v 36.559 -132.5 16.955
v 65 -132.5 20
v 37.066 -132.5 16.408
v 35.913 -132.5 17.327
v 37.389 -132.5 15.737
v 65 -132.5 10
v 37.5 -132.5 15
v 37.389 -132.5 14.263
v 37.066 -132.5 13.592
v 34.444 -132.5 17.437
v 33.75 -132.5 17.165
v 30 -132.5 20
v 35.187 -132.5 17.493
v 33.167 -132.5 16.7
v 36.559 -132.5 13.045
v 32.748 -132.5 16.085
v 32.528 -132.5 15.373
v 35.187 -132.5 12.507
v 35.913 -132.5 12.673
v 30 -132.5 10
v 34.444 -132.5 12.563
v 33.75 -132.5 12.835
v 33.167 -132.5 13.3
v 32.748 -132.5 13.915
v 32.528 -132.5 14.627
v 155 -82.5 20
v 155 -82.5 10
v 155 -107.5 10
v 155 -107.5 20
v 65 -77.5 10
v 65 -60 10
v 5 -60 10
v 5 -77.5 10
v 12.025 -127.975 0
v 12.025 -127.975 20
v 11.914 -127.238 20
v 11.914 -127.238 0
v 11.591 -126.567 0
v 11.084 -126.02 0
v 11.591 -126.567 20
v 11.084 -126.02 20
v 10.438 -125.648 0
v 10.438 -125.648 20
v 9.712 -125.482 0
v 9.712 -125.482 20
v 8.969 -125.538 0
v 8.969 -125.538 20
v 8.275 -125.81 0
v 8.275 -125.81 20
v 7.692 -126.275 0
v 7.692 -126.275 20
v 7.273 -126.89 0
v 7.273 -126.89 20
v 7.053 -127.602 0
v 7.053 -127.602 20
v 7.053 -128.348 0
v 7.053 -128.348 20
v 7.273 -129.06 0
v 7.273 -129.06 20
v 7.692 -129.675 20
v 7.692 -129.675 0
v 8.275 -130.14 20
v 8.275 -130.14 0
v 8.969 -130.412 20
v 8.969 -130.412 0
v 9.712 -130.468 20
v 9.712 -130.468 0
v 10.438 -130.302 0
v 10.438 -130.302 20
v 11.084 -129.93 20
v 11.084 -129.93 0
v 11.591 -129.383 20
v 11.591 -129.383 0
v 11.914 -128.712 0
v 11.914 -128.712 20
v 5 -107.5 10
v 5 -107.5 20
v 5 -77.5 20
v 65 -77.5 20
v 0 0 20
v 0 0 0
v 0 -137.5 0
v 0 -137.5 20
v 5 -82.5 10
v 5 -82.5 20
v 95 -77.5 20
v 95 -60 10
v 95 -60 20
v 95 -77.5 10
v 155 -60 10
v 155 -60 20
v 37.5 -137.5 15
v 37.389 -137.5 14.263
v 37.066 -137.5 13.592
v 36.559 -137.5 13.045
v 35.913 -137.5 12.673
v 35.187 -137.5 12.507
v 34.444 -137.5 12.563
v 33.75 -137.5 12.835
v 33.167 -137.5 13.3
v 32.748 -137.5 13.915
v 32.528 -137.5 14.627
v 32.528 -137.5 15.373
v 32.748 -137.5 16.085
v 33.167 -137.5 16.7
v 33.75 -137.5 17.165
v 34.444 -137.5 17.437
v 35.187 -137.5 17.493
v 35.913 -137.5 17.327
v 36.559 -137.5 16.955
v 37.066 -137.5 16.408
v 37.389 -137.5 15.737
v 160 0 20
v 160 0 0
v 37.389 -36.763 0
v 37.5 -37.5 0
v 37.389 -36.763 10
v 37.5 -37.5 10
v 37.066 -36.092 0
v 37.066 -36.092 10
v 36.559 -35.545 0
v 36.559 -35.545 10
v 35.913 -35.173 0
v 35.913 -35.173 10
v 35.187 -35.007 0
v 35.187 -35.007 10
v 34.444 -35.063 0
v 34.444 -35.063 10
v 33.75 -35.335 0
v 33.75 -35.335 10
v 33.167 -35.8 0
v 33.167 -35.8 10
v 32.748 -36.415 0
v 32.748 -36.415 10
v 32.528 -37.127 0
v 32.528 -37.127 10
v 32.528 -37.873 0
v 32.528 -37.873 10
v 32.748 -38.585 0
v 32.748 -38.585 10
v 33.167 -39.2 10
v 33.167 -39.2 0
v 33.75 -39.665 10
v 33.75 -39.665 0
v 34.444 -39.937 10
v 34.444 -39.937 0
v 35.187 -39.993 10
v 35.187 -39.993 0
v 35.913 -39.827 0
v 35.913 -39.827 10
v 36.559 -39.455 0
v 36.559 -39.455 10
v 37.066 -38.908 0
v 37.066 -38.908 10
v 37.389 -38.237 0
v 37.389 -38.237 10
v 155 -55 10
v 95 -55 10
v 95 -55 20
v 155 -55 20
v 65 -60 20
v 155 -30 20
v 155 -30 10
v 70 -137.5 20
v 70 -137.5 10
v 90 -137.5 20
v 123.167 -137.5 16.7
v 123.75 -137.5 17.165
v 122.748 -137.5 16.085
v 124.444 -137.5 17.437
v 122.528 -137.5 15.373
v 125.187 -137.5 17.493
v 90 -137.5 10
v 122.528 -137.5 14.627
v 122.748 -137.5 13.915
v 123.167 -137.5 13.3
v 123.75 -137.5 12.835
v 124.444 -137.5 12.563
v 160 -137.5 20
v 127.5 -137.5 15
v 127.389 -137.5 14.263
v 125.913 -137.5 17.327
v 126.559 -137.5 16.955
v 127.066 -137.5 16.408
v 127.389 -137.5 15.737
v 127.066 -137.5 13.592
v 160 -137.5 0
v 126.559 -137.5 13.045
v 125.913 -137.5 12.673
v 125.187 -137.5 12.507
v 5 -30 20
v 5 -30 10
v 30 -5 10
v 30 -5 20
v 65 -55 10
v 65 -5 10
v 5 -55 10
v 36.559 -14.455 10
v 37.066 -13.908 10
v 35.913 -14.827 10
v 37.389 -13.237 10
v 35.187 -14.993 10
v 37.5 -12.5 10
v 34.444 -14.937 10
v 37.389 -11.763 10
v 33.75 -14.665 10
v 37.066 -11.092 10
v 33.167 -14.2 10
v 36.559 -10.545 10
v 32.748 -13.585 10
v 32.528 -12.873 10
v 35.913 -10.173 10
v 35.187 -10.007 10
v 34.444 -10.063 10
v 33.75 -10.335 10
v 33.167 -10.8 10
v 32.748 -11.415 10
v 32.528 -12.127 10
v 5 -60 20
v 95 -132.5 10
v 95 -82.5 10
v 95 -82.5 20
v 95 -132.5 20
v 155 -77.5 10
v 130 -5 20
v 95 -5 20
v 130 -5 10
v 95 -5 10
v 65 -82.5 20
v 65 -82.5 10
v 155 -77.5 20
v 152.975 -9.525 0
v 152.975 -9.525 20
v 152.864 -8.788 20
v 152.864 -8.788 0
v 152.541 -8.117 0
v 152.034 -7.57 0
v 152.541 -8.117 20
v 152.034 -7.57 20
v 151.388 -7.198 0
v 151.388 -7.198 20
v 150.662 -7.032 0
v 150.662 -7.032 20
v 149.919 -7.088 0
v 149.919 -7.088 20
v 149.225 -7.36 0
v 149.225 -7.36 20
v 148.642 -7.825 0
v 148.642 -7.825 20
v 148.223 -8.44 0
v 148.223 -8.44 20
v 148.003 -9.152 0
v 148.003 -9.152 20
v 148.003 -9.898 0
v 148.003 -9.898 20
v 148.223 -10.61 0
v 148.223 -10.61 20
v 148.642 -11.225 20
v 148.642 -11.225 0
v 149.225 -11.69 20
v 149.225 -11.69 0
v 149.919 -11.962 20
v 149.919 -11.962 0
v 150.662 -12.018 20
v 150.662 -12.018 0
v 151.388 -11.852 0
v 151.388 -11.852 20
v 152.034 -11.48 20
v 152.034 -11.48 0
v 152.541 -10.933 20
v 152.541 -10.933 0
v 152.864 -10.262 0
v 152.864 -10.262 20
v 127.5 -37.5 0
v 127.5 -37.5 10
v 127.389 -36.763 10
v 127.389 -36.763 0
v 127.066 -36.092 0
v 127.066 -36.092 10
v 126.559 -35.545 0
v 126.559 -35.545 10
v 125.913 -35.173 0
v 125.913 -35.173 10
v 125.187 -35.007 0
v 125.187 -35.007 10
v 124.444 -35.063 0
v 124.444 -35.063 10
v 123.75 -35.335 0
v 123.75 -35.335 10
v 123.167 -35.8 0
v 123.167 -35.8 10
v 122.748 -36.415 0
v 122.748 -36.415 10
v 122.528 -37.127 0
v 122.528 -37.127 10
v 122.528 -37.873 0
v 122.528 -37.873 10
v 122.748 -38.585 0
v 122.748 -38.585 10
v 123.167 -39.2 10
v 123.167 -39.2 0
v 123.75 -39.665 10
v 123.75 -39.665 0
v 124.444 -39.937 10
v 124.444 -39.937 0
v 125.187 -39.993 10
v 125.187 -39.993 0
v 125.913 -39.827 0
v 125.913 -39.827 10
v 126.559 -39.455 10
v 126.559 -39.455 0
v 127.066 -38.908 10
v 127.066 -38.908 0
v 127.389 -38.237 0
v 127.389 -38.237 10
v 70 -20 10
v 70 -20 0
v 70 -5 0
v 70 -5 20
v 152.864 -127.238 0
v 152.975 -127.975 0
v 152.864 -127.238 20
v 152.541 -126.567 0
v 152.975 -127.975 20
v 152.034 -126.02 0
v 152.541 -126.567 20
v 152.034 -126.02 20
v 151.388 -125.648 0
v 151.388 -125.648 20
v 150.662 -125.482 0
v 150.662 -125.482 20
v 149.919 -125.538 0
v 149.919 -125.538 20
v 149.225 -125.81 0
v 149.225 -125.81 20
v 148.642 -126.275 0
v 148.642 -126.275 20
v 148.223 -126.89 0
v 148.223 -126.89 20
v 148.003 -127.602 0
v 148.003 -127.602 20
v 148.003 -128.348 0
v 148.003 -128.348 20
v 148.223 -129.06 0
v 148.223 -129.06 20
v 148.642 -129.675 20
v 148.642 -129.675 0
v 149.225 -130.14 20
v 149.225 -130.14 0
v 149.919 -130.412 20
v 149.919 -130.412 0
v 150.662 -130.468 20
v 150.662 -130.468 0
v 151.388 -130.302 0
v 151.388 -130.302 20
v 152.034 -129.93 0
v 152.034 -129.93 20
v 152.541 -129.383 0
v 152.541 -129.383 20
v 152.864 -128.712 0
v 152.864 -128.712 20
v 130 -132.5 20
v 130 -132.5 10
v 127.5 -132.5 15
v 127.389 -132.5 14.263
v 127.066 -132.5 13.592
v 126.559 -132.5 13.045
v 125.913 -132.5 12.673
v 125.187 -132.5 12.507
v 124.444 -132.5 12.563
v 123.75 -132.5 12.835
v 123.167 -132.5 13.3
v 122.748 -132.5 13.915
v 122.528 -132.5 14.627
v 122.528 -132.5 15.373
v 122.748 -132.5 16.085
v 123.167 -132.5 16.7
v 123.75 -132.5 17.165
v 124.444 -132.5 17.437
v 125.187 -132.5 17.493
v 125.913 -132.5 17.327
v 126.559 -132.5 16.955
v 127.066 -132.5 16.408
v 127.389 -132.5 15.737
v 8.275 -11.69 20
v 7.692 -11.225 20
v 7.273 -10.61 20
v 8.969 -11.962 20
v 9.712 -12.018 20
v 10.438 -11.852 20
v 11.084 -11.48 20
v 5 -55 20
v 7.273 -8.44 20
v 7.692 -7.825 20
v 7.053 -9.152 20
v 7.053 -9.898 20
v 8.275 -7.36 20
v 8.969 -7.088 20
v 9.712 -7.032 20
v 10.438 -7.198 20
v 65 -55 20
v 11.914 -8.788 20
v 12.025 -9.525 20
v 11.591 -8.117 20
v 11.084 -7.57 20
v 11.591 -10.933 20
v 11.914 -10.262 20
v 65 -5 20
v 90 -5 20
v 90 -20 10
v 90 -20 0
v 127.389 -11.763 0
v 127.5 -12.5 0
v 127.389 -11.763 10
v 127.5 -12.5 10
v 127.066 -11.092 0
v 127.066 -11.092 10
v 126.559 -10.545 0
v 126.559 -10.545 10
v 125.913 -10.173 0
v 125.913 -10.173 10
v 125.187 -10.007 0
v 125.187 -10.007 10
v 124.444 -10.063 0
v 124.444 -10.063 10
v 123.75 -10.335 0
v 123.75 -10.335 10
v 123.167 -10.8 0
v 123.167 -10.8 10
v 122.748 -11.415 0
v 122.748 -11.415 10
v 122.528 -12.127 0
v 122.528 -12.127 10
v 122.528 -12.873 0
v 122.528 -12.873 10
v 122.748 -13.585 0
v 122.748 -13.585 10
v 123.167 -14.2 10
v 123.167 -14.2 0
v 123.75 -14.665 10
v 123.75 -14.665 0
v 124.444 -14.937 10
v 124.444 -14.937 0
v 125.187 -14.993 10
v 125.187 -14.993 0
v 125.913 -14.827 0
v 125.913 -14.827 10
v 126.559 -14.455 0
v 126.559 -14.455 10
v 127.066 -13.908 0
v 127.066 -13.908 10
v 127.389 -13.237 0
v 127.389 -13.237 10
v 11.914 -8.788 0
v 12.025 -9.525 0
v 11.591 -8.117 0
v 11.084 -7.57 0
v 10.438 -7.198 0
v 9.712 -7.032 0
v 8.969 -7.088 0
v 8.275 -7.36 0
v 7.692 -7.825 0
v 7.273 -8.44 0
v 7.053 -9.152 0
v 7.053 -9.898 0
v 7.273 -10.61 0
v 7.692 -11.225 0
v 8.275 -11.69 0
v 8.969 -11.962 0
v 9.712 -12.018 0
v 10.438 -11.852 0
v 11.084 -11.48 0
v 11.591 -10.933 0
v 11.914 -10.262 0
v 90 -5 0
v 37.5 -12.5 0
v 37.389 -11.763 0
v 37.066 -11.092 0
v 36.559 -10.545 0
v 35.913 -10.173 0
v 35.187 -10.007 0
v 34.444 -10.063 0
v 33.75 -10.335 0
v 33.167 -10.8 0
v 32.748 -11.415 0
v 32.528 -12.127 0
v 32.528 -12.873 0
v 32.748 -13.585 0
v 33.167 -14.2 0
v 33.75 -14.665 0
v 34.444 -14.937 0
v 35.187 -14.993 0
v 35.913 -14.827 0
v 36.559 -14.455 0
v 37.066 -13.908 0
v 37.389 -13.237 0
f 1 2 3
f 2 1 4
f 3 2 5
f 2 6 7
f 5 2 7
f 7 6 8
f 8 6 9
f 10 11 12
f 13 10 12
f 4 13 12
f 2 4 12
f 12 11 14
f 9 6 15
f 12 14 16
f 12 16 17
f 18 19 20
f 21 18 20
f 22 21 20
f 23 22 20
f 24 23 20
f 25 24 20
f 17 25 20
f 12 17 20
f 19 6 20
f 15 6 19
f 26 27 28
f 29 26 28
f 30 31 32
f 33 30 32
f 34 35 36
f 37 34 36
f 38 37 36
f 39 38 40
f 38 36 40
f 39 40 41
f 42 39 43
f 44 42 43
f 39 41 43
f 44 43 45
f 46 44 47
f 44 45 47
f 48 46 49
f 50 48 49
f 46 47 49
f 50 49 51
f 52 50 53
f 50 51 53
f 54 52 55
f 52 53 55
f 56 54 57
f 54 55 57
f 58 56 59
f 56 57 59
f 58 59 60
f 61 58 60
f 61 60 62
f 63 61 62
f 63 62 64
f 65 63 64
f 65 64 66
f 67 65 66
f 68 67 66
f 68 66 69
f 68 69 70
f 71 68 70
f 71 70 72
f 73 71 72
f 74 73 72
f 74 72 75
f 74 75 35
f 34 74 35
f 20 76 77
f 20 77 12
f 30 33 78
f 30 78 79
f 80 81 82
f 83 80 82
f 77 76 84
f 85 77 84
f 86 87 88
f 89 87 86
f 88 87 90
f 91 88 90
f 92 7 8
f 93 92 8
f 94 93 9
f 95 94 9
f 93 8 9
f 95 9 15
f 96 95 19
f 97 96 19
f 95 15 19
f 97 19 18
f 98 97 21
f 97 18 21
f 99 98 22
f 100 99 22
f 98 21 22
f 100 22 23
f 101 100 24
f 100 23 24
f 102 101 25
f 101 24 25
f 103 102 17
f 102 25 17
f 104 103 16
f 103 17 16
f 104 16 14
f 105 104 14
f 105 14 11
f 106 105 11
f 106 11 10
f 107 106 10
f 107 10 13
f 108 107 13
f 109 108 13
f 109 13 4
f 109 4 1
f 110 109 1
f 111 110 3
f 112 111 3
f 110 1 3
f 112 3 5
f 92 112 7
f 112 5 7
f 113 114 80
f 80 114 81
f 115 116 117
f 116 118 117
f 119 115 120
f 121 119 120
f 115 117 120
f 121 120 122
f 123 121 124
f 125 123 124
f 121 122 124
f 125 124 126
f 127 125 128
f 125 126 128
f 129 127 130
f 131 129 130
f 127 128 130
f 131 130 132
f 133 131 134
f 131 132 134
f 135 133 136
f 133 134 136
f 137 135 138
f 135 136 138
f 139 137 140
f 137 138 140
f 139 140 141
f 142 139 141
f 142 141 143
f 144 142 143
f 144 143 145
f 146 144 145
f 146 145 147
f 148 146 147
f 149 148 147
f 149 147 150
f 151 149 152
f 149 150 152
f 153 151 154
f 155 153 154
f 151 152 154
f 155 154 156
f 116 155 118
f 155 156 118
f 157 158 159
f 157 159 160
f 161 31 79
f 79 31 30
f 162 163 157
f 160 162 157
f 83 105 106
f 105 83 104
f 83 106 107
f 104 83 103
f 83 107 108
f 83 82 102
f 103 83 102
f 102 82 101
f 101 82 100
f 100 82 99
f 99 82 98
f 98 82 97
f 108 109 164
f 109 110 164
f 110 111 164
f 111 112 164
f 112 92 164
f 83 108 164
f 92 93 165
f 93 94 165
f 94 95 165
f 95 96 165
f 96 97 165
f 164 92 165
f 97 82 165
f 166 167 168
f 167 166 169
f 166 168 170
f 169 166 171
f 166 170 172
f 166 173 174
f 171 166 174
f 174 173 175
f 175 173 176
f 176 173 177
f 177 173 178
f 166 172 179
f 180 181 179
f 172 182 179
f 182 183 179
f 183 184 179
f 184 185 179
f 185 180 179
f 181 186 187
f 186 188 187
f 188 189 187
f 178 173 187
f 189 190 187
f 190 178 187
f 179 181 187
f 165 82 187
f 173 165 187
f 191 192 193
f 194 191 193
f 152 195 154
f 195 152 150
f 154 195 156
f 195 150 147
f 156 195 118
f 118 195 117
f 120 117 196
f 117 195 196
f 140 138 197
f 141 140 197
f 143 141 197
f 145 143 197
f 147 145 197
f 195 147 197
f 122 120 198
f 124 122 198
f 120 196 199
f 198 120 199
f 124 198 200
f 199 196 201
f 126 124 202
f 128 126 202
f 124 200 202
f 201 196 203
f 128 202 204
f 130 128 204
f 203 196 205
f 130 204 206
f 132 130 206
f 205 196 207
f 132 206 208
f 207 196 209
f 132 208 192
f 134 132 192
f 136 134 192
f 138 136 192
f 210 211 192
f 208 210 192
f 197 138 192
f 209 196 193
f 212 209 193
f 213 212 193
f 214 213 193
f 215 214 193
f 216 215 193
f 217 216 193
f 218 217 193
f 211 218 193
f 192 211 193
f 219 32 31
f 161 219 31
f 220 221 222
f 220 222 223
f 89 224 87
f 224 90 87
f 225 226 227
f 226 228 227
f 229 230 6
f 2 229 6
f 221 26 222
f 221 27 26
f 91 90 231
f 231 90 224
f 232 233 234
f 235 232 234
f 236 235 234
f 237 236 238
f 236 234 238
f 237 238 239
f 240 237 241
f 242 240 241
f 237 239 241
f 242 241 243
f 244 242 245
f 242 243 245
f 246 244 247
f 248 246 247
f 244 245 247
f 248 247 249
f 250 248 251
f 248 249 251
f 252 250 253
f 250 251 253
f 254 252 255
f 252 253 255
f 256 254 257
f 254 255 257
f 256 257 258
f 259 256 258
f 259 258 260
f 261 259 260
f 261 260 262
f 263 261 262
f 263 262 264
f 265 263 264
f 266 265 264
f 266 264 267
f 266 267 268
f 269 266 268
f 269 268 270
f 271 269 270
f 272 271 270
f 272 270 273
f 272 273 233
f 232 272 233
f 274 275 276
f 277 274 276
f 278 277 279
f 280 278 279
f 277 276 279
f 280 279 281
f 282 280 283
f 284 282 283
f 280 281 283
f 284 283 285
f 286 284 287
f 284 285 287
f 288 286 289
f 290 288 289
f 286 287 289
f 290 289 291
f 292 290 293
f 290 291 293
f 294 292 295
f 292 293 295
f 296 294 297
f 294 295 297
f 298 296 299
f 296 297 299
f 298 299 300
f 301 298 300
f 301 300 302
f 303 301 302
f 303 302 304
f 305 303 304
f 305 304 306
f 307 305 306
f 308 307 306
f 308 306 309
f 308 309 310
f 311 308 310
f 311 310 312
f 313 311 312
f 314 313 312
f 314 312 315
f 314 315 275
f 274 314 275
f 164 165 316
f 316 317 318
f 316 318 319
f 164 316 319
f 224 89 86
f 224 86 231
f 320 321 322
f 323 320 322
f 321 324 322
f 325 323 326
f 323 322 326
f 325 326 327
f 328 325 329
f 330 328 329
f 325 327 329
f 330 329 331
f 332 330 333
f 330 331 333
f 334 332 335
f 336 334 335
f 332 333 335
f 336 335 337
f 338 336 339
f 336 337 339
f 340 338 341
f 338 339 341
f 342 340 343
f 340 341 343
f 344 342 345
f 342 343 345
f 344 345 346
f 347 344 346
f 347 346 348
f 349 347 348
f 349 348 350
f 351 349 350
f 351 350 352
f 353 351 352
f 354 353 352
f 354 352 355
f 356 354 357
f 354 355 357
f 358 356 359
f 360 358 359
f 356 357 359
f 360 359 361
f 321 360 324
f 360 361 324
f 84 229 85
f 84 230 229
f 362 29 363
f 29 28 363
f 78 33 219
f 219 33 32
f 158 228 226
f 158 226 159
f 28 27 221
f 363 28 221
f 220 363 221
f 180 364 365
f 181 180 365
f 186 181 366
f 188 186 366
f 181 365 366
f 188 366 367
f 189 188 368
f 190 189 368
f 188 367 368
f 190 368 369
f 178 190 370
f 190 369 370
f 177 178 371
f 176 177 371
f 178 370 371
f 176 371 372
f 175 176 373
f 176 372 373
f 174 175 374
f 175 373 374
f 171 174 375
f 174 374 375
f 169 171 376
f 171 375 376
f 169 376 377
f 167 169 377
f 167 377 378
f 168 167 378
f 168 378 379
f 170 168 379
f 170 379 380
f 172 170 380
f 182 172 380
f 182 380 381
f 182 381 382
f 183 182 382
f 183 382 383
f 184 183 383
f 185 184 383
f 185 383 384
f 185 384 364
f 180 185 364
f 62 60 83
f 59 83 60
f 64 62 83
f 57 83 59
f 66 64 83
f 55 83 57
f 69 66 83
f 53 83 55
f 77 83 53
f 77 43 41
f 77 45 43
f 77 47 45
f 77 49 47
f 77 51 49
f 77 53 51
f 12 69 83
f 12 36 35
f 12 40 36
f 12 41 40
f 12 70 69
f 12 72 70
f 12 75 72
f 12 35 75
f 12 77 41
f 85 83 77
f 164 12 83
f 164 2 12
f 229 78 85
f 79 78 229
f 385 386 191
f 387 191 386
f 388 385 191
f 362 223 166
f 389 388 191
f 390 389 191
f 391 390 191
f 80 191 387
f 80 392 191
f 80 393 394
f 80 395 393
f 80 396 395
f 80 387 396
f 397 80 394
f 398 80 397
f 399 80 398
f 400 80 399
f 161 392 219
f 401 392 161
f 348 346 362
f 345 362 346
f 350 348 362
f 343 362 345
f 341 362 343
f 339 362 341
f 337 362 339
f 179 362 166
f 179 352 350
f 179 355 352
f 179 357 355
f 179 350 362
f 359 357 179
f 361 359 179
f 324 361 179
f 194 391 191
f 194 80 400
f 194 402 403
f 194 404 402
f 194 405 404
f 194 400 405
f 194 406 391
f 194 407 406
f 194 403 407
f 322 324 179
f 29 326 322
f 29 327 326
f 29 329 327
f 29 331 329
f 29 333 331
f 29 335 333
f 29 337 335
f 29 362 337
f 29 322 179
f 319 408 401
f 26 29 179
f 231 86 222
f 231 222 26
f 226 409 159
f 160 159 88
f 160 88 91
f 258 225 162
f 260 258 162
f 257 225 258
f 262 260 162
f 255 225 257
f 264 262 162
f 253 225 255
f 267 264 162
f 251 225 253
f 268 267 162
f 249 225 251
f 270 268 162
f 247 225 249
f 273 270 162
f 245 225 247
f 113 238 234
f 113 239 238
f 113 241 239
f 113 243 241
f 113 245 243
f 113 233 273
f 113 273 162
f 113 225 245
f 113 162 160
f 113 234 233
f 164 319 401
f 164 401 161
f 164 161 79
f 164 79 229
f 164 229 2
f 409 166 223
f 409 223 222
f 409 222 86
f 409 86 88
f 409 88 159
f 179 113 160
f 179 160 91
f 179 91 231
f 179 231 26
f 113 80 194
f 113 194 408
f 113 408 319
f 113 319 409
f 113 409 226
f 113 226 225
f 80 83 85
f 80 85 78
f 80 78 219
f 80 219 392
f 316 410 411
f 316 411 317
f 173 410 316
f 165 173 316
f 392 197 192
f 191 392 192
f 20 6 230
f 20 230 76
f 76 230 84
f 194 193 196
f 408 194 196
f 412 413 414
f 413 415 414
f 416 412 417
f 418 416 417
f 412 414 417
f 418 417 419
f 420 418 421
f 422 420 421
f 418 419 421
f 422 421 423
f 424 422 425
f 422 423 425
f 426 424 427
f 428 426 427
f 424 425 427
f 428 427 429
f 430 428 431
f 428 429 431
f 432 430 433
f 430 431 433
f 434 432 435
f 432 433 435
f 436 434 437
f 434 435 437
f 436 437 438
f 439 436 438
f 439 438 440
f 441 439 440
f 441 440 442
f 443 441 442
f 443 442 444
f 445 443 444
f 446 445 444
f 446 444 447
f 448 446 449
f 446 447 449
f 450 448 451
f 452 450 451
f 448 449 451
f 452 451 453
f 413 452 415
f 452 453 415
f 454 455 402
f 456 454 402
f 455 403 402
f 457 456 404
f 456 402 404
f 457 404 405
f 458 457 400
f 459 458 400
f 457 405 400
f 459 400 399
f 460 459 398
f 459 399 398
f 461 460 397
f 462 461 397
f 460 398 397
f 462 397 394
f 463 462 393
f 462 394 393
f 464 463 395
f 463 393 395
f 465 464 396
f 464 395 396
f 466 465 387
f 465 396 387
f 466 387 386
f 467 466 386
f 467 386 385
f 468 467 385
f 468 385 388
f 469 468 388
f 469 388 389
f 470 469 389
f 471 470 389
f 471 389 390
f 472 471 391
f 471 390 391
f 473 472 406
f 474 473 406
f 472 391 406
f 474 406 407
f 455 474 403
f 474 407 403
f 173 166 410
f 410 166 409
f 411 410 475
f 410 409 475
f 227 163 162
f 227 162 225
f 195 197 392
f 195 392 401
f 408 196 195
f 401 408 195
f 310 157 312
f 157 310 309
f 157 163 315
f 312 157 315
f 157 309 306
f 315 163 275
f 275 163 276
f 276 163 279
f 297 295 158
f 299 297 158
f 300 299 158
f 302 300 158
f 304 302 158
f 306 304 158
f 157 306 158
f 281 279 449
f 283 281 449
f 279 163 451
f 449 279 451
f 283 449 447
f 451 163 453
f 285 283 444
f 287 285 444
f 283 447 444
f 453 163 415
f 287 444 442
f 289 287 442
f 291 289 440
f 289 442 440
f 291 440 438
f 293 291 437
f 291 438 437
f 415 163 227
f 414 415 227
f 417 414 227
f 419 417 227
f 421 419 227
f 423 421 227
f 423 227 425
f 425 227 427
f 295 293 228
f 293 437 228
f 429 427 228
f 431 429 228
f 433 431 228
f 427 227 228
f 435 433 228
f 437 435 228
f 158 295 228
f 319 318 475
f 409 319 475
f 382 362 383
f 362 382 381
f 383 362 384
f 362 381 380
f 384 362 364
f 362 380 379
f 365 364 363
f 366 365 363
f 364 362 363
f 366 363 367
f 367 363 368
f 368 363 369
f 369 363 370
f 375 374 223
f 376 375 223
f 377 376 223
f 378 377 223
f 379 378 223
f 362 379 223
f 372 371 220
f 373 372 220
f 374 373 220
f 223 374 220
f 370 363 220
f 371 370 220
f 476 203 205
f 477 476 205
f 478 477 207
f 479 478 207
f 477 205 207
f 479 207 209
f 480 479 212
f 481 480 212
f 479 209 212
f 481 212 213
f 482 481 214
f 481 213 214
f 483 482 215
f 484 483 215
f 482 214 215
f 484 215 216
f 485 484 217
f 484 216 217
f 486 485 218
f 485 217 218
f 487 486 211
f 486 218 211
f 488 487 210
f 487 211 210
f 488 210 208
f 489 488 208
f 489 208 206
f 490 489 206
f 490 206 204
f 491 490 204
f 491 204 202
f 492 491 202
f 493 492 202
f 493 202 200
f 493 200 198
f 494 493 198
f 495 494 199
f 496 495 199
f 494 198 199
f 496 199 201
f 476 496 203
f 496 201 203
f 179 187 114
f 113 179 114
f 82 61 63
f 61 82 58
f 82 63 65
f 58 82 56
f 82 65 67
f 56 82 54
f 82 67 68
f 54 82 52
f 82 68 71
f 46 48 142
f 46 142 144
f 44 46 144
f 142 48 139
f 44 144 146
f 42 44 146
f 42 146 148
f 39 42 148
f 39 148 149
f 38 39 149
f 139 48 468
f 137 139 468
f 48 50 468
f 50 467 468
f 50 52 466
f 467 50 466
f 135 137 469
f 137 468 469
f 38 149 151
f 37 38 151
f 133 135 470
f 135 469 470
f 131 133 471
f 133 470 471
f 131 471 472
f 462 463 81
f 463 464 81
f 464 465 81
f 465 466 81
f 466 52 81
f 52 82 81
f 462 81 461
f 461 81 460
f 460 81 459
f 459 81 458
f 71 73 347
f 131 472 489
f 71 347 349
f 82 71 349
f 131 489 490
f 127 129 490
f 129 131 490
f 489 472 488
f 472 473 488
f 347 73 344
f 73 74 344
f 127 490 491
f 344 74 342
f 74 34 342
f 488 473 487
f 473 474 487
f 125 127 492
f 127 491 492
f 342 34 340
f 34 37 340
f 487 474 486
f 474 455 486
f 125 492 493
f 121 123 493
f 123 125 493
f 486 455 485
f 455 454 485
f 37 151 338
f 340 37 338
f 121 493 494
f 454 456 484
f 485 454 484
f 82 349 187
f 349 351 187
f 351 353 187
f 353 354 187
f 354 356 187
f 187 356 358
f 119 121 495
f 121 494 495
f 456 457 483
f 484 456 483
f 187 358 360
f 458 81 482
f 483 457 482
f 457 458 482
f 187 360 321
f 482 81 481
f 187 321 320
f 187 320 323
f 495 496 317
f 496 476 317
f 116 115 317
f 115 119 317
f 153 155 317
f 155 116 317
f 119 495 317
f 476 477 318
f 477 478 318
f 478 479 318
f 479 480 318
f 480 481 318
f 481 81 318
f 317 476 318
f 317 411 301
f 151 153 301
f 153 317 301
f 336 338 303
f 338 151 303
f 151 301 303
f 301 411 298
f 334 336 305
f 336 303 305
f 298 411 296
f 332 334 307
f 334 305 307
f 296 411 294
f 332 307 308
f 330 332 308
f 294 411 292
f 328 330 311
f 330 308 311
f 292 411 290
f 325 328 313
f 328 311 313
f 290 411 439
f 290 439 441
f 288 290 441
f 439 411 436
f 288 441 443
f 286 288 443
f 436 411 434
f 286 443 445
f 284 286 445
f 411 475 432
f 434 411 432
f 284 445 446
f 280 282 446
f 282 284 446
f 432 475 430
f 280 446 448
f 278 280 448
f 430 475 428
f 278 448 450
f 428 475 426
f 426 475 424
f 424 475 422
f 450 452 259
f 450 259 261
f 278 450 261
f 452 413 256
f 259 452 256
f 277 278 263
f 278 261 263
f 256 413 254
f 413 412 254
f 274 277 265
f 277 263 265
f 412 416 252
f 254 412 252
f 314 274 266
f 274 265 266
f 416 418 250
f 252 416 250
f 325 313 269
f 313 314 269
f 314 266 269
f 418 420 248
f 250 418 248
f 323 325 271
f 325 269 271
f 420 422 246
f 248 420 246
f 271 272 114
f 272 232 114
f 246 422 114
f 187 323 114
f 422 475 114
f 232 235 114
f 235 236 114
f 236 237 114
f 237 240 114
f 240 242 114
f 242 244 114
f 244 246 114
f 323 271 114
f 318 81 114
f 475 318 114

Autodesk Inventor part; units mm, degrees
ref_plane "YZ Plane" through (0, 0, 0) normal (1, 0, 0) x (0, 1, 0)
ref_plane "XZ Plane" through (0, 0, 0) normal (0, 1, 0) x (-1, 0, 0)
ref_plane "XY Plane" through (0, 0, 0) normal (0, 0, 1) x (1, 0, 0)
sketch "Sketch1" plane through (0, 0, 0) normal (0, 0, 1) x (1, 0, 0)
  line L0 (0, 0) -> (160, 0)
  line L1 (160, 0) -> (160, -137.5)
  line L2 (160, -137.5) -> (0, -137.5)
  line L3 (0, -137.5) -> (0, 0)
  dimension "d0" = 160
  dimension "d1" = 137.5
extrude "Extrusion1" add sketch "Sketch1" along normal blind 10
sketch "Sketch2" plane through (0, 0, 10) normal (0, 0, 1) x (1, 0, 0)
  circle A0 centre (35, -12.5) radius 2.5
  circle A1 centre (35, -37.5) radius 2.5
  line L0 (160, 0) -> (0, 0) projected
  line L1 (0, 0) -> (0, -137.5) projected
  circle A2 centre (125, -12.5) radius 2.5
  circle A3 centre (125, -37.5) radius 2.5
  line L2 (160, -137.5) -> (160, 0) projected
  dimension "d4" = 5
  dimension "d5" = 5
  dimension "d6" = 12.5
  dimension "d7" = 25
  dimension "d8" = 35
  dimension "d9" = 5
  dimension "d10" = 5
  dimension "d11" = 35
extrude "Extrusion2" cut sketch "Sketch2" against normal through all
sketch "Sketch3" plane through (0, 0, 10) normal (0, 0, 1) x (1, 0, 0)
  circle A0 centre (125, -12.5) radius 2.5 projected
  circle A1 centre (35, -12.5) radius 2.5 projected
  circle A2 centre (35, -37.5) radius 2.5 projected
  circle A3 centre (125, -37.5) radius 2.5 projected
  line L0 (160, 0) -> (0, 0) projected
  line L1 (0, 0) -> (0, -137.5) projected
  line L2 (0, -137.5) -> (160, -137.5) projected
  line L3 (160, -137.5) -> (160, 0) projected
  line L4 (5, -132.5) -> (5, -5)
  line L5 (5, -5) -> (155, -5)
  line L6 (155, -5) -> (155, -132.5)
  line L7 (155, -132.5) -> (5, -132.5)
  dimension "d14" = 5
extrude "Extrusion3" add sketch "Sketch3" along normal blind 10 contours L3 L2 L1 L0
sketch "Sketch4" plane through (0, 0, 10) normal (0, 0, 1) x (1, 0, 0)
  line L0 (155, -5) -> (5, -5) projected
  line L1 (70, -5) -> (90, -5)
  line L2 (90, -5) -> (90, -20)
  line L3 (90, -20) -> (70, -20)
  line L4 (70, -20) -> (70, -5)
  line L5 (0, 0) -> (0, -137.5) projected
  dimension "d17" = 20
  dimension "d18" = 15
  dimension "d19" = 70
extrude "Extrusion4" cut sketch "Sketch4" against normal through all
sketch "Sketch5" plane through (5, -132.5, 10) normal (0, 1, 0) x (1, 0, 0)
  circle A0 centre (30, -5) radius 2.5
  circle A1 centre (120, -5) radius 2.5
  line L0 (30, -5) -> (120, -5) construction
  line L1 (-5, -10) -> (155, -10) projected
  point P0 (-5, 10)
  point P1 (75, -10)
  point P2 (75, -5)
  dimension "d22" = 5
  dimension "d23" = 5
  dimension "d24" = 5
  dimension "d25" = 90
extrude "Extrusion5" cut sketch "Sketch5" against normal through all
sketch "Sketch6" plane through (5, -132.5, 10) normal (0, 1, 0) x (1, 0, 0)
  line L0 (-5, -10) -> (155, -10) projected
  line L1 (65, -10) -> (85, -10)
  line L2 (85, -10) -> (85, 0)
  line L3 (85, 0) -> (65, 0)
  line L4 (65, 0) -> (65, -10)
  point P0 (-5, 10)
  point P1 (75, -10)
  point P2 (75, -10)
  dimension "d28" = 20
  dimension "d29" = 10
extrude "Extrusion6" cut sketch "Sketch6" against normal through all
sketch "Sketch7" plane through (0, 0, 10) normal (0, 0, 1) x (1, 0, 0)
  line L0 (70, -137.5) -> (70, -132.5) projected
  line L1 (70, -132.5) -> (5, -132.5) projected
  line L2 (5, -132.5) -> (5, -5) projected
  line L3 (5, -5) -> (155, -5) projected
  line L4 (155, -5) -> (155, -132.5) projected
  line L5 (155, -132.5) -> (90, -132.5) projected
  line L6 (90, -132.5) -> (90, -137.5) projected
  line L7 (90, -137.5) -> (160, -137.5) projected
  line L8 (160, -137.5) -> (160, 0) projected
  line L9 (160, 0) -> (0, 0) projected
  line L10 (0, 0) -> (0, -137.5) projected
  line L11 (0, -137.5) -> (70, -137.5) projected
  line L12 (5, -132.5) -> (5, -5) projected
  line L13 (5, -55) -> (155, -55)
  line L14 (5, -60) -> (155, -60)
  line L15 (155, -132.5) -> (155, -5) projected
  line L16 (5, -55) -> (5, -60)
  line L17 (155, -55) -> (155, -60)
  line L18 (5, -77.5) -> (155, -77.5)
  line L19 (155, -77.5) -> (155, -82.5)
  line L20 (155, -82.5) -> (5, -82.5)
  line L21 (5, -82.5) -> (5, -77.5)
  dimension "d32" = 5
  dimension "d33" = 50
  dimension "d34" = 5
  dimension "d35" = 50
extrude "Extrusion7" add sketch "Sketch7" along normal blind 10 contours L2 L18 L4 L20 | L2 L13 L4 L14
sketch "Sketch8" plane through (0, 0, 10) normal (0, 0, 1) x (1, 0, 0)
  line L0 (90, -5) -> (70, -5) projected
  line L1 (0, -137.5) -> (70, -137.5) projected
  line L2 (70, -5) -> (65, -5)
  line L3 (65, -5) -> (65, -137.5)
  line L4 (65, -137.5) -> (70, -137.5)
  line L5 (70, -137.5) -> (70, -5)
  line L6 (155, -5) -> (90, -5) projected
  line L7 (155, -132.5) -> (90, -132.5) projected
  line L8 (90, -5) -> (95, -5)
  line L9 (95, -5) -> (95, -132.5)
  line L10 (95, -132.5) -> (90, -132.5)
  line L11 (90, -132.5) -> (90, -5)
  point P0 (0, 0)
  dimension "d38" = 5
  dimension "d39" = 5
extrude "Extrusion8" add sketch "Sketch8" along normal blind 10
sketch "Sketch9" plane through (0, 0, 10) normal (0, 0, 1) x (1, 0, 0)
  line L0 (90, -137.5) -> (70, -137.5)
  line L1 (70, -137.5) -> (70, -20)
  line L2 (70, -20) -> (90, -20)
  line L3 (90, -20) -> (90, -137.5)
  point P0 (0, 0)
extrude "Extrusion9" cut sketch "Sketch9" along normal through all
sketch "Sketch10" plane through (0, 0, 10) normal (0, 0, 1) x (1, 0, 0)
  line L0 (5, -55) -> (5, -5) projected
  line L1 (5, -30) -> (30, -5)
  line L2 (5, -5) -> (65, -5) projected
  line L3 (5, -30) -> (5, -5)
  line L4 (5, -5) -> (30, -5)
  line L5 (155, -5) -> (155, -55) projected
  line L6 (155, -30) -> (130, -5)
  line L7 (95, -5) -> (155, -5) projected
  line L8 (5, -82.5) -> (5, -132.5) projected
  line L9 (5, -132.5) -> (65, -132.5) projected
  line L10 (95, -82.5) -> (95, -132.5) projected
  line L11 (95, -132.5) -> (155, -132.5) projected
  line L12 (155, -132.5) -> (155, -82.5) projected
  line L13 (155, -82.5) -> (95, -82.5) projected
  line L14 (70, -137.5) -> (70, -5) projected
  line L15 (70, -5) -> (90, -5) projected
  line L16 (90, -5) -> (90, -137.5) projected
  line L17 (90, -137.5) -> (160, -137.5) projected
  line L18 (160, -137.5) -> (160, 0) projected
  line L19 (160, 0) -> (0, 0) projected
  line L20 (0, 0) -> (0, -137.5) projected
  line L21 (0, -137.5) -> (70, -137.5) projected
  line L22 (95, -5) -> (155, -5) projected
  line L23 (155, -5) -> (155, -55) projected
  line L24 (155, -55) -> (95, -55) projected
  line L25 (95, -55) -> (95, -5) projected
  line L26 (95, -60) -> (155, -60) projected
  line L27 (155, -60) -> (155, -77.5) projected
  line L28 (155, -77.5) -> (95, -77.5) projected
  line L29 (95, -77.5) -> (95, -60) projected
  line L30 (65, -132.5) -> (5, -132.5) projected
  line L31 (5, -132.5) -> (5, -82.5) projected
  line L32 (65, -60) -> (65, -77.5) projected
  line L33 (65, -77.5) -> (5, -77.5) projected
  line L34 (5, -77.5) -> (5, -60) projected
  line L35 (5, -60) -> (65, -60) projected
  line L36 (95, -132.5) -> (95, -82.5) projected
  line L37 (95, -82.5) -> (155, -82.5) projected
  line L38 (155, -82.5) -> (155, -132.5) projected
  line L39 (155, -132.5) -> (95, -132.5) projected
  line L40 (65, -5) -> (65, -55) projected
  line L41 (65, -55) -> (5, -55) projected
  line L42 (5, -55) -> (5, -5) projected
  line L43 (5, -5) -> (65, -5) projected
  line L44 (130, -5) -> (155, -5)
  line L45 (155, -5) -> (155, -30)
  line L46 (5, -107.5) -> (30, -132.5)
  line L47 (5, -107.5) -> (5, -132.5)
  line L48 (5, -132.5) -> (30, -132.5)
  line L49 (155, -107.5) -> (130, -132.5)
  line L50 (130, -132.5) -> (155, -132.5)
  line L51 (155, -132.5) -> (155, -107.5)
  dimension "d44" = 30
  dimension "d45" = 30
  dimension "d47" = 30
  dimension "d48" = 30
  dimension "d49" = 30
  dimension "d50" = 30
  dimension "d51" = 30
  dimension "d52" = 30
extrude "Extrusion10" add sketch "Sketch10" along normal blind 10 contours L0 L2 L1 | L5 L6 L7 | L46 L9 L8 | L49 L12 L11
sketch "Sketch11" plane through (0, 0, 20) normal (0, 0, 1) x (1, 0, 0)
  circle A0 centre (9.525, -9.525) radius 2.5
  line L0 (0, 0) -> (160, 0) construction
  line L1 (160, 0) -> (160, -137.5) construction
  line L2 (0, 0) -> (160, 0) construction
  line L3 (160, 0) -> (160, -137.5) construction
  line L4 (160, -137.5) -> (0, -137.5) construction
  line L5 (0, -137.5) -> (0, 0) construction
  line L6 (9.525, -9.525) -> (150.475, -9.525) construction
  line L7 (150.475, -9.525) -> (150.475, -127.975) construction
  line L8 (150.475, -127.975) -> (9.525, -127.975) construction
  line L9 (9.525, -127.975) -> (9.525, -9.525) construction
  circle A1 centre (150.475, -9.525) radius 2.5
  circle A2 centre (150.475, -127.975) radius 2.5
  circle A3 centre (9.525, -127.975) radius 2.5
  dimension "d55" = 5
  dimension "d56" = 9.525
  dimension "d57" = 5
  dimension "d58" = 5
  dimension "d59" = 5
extrude "Extrusion11" cut sketch "Sketch11" against normal through all
properties part number "NA002" material "ABS Plastic"
